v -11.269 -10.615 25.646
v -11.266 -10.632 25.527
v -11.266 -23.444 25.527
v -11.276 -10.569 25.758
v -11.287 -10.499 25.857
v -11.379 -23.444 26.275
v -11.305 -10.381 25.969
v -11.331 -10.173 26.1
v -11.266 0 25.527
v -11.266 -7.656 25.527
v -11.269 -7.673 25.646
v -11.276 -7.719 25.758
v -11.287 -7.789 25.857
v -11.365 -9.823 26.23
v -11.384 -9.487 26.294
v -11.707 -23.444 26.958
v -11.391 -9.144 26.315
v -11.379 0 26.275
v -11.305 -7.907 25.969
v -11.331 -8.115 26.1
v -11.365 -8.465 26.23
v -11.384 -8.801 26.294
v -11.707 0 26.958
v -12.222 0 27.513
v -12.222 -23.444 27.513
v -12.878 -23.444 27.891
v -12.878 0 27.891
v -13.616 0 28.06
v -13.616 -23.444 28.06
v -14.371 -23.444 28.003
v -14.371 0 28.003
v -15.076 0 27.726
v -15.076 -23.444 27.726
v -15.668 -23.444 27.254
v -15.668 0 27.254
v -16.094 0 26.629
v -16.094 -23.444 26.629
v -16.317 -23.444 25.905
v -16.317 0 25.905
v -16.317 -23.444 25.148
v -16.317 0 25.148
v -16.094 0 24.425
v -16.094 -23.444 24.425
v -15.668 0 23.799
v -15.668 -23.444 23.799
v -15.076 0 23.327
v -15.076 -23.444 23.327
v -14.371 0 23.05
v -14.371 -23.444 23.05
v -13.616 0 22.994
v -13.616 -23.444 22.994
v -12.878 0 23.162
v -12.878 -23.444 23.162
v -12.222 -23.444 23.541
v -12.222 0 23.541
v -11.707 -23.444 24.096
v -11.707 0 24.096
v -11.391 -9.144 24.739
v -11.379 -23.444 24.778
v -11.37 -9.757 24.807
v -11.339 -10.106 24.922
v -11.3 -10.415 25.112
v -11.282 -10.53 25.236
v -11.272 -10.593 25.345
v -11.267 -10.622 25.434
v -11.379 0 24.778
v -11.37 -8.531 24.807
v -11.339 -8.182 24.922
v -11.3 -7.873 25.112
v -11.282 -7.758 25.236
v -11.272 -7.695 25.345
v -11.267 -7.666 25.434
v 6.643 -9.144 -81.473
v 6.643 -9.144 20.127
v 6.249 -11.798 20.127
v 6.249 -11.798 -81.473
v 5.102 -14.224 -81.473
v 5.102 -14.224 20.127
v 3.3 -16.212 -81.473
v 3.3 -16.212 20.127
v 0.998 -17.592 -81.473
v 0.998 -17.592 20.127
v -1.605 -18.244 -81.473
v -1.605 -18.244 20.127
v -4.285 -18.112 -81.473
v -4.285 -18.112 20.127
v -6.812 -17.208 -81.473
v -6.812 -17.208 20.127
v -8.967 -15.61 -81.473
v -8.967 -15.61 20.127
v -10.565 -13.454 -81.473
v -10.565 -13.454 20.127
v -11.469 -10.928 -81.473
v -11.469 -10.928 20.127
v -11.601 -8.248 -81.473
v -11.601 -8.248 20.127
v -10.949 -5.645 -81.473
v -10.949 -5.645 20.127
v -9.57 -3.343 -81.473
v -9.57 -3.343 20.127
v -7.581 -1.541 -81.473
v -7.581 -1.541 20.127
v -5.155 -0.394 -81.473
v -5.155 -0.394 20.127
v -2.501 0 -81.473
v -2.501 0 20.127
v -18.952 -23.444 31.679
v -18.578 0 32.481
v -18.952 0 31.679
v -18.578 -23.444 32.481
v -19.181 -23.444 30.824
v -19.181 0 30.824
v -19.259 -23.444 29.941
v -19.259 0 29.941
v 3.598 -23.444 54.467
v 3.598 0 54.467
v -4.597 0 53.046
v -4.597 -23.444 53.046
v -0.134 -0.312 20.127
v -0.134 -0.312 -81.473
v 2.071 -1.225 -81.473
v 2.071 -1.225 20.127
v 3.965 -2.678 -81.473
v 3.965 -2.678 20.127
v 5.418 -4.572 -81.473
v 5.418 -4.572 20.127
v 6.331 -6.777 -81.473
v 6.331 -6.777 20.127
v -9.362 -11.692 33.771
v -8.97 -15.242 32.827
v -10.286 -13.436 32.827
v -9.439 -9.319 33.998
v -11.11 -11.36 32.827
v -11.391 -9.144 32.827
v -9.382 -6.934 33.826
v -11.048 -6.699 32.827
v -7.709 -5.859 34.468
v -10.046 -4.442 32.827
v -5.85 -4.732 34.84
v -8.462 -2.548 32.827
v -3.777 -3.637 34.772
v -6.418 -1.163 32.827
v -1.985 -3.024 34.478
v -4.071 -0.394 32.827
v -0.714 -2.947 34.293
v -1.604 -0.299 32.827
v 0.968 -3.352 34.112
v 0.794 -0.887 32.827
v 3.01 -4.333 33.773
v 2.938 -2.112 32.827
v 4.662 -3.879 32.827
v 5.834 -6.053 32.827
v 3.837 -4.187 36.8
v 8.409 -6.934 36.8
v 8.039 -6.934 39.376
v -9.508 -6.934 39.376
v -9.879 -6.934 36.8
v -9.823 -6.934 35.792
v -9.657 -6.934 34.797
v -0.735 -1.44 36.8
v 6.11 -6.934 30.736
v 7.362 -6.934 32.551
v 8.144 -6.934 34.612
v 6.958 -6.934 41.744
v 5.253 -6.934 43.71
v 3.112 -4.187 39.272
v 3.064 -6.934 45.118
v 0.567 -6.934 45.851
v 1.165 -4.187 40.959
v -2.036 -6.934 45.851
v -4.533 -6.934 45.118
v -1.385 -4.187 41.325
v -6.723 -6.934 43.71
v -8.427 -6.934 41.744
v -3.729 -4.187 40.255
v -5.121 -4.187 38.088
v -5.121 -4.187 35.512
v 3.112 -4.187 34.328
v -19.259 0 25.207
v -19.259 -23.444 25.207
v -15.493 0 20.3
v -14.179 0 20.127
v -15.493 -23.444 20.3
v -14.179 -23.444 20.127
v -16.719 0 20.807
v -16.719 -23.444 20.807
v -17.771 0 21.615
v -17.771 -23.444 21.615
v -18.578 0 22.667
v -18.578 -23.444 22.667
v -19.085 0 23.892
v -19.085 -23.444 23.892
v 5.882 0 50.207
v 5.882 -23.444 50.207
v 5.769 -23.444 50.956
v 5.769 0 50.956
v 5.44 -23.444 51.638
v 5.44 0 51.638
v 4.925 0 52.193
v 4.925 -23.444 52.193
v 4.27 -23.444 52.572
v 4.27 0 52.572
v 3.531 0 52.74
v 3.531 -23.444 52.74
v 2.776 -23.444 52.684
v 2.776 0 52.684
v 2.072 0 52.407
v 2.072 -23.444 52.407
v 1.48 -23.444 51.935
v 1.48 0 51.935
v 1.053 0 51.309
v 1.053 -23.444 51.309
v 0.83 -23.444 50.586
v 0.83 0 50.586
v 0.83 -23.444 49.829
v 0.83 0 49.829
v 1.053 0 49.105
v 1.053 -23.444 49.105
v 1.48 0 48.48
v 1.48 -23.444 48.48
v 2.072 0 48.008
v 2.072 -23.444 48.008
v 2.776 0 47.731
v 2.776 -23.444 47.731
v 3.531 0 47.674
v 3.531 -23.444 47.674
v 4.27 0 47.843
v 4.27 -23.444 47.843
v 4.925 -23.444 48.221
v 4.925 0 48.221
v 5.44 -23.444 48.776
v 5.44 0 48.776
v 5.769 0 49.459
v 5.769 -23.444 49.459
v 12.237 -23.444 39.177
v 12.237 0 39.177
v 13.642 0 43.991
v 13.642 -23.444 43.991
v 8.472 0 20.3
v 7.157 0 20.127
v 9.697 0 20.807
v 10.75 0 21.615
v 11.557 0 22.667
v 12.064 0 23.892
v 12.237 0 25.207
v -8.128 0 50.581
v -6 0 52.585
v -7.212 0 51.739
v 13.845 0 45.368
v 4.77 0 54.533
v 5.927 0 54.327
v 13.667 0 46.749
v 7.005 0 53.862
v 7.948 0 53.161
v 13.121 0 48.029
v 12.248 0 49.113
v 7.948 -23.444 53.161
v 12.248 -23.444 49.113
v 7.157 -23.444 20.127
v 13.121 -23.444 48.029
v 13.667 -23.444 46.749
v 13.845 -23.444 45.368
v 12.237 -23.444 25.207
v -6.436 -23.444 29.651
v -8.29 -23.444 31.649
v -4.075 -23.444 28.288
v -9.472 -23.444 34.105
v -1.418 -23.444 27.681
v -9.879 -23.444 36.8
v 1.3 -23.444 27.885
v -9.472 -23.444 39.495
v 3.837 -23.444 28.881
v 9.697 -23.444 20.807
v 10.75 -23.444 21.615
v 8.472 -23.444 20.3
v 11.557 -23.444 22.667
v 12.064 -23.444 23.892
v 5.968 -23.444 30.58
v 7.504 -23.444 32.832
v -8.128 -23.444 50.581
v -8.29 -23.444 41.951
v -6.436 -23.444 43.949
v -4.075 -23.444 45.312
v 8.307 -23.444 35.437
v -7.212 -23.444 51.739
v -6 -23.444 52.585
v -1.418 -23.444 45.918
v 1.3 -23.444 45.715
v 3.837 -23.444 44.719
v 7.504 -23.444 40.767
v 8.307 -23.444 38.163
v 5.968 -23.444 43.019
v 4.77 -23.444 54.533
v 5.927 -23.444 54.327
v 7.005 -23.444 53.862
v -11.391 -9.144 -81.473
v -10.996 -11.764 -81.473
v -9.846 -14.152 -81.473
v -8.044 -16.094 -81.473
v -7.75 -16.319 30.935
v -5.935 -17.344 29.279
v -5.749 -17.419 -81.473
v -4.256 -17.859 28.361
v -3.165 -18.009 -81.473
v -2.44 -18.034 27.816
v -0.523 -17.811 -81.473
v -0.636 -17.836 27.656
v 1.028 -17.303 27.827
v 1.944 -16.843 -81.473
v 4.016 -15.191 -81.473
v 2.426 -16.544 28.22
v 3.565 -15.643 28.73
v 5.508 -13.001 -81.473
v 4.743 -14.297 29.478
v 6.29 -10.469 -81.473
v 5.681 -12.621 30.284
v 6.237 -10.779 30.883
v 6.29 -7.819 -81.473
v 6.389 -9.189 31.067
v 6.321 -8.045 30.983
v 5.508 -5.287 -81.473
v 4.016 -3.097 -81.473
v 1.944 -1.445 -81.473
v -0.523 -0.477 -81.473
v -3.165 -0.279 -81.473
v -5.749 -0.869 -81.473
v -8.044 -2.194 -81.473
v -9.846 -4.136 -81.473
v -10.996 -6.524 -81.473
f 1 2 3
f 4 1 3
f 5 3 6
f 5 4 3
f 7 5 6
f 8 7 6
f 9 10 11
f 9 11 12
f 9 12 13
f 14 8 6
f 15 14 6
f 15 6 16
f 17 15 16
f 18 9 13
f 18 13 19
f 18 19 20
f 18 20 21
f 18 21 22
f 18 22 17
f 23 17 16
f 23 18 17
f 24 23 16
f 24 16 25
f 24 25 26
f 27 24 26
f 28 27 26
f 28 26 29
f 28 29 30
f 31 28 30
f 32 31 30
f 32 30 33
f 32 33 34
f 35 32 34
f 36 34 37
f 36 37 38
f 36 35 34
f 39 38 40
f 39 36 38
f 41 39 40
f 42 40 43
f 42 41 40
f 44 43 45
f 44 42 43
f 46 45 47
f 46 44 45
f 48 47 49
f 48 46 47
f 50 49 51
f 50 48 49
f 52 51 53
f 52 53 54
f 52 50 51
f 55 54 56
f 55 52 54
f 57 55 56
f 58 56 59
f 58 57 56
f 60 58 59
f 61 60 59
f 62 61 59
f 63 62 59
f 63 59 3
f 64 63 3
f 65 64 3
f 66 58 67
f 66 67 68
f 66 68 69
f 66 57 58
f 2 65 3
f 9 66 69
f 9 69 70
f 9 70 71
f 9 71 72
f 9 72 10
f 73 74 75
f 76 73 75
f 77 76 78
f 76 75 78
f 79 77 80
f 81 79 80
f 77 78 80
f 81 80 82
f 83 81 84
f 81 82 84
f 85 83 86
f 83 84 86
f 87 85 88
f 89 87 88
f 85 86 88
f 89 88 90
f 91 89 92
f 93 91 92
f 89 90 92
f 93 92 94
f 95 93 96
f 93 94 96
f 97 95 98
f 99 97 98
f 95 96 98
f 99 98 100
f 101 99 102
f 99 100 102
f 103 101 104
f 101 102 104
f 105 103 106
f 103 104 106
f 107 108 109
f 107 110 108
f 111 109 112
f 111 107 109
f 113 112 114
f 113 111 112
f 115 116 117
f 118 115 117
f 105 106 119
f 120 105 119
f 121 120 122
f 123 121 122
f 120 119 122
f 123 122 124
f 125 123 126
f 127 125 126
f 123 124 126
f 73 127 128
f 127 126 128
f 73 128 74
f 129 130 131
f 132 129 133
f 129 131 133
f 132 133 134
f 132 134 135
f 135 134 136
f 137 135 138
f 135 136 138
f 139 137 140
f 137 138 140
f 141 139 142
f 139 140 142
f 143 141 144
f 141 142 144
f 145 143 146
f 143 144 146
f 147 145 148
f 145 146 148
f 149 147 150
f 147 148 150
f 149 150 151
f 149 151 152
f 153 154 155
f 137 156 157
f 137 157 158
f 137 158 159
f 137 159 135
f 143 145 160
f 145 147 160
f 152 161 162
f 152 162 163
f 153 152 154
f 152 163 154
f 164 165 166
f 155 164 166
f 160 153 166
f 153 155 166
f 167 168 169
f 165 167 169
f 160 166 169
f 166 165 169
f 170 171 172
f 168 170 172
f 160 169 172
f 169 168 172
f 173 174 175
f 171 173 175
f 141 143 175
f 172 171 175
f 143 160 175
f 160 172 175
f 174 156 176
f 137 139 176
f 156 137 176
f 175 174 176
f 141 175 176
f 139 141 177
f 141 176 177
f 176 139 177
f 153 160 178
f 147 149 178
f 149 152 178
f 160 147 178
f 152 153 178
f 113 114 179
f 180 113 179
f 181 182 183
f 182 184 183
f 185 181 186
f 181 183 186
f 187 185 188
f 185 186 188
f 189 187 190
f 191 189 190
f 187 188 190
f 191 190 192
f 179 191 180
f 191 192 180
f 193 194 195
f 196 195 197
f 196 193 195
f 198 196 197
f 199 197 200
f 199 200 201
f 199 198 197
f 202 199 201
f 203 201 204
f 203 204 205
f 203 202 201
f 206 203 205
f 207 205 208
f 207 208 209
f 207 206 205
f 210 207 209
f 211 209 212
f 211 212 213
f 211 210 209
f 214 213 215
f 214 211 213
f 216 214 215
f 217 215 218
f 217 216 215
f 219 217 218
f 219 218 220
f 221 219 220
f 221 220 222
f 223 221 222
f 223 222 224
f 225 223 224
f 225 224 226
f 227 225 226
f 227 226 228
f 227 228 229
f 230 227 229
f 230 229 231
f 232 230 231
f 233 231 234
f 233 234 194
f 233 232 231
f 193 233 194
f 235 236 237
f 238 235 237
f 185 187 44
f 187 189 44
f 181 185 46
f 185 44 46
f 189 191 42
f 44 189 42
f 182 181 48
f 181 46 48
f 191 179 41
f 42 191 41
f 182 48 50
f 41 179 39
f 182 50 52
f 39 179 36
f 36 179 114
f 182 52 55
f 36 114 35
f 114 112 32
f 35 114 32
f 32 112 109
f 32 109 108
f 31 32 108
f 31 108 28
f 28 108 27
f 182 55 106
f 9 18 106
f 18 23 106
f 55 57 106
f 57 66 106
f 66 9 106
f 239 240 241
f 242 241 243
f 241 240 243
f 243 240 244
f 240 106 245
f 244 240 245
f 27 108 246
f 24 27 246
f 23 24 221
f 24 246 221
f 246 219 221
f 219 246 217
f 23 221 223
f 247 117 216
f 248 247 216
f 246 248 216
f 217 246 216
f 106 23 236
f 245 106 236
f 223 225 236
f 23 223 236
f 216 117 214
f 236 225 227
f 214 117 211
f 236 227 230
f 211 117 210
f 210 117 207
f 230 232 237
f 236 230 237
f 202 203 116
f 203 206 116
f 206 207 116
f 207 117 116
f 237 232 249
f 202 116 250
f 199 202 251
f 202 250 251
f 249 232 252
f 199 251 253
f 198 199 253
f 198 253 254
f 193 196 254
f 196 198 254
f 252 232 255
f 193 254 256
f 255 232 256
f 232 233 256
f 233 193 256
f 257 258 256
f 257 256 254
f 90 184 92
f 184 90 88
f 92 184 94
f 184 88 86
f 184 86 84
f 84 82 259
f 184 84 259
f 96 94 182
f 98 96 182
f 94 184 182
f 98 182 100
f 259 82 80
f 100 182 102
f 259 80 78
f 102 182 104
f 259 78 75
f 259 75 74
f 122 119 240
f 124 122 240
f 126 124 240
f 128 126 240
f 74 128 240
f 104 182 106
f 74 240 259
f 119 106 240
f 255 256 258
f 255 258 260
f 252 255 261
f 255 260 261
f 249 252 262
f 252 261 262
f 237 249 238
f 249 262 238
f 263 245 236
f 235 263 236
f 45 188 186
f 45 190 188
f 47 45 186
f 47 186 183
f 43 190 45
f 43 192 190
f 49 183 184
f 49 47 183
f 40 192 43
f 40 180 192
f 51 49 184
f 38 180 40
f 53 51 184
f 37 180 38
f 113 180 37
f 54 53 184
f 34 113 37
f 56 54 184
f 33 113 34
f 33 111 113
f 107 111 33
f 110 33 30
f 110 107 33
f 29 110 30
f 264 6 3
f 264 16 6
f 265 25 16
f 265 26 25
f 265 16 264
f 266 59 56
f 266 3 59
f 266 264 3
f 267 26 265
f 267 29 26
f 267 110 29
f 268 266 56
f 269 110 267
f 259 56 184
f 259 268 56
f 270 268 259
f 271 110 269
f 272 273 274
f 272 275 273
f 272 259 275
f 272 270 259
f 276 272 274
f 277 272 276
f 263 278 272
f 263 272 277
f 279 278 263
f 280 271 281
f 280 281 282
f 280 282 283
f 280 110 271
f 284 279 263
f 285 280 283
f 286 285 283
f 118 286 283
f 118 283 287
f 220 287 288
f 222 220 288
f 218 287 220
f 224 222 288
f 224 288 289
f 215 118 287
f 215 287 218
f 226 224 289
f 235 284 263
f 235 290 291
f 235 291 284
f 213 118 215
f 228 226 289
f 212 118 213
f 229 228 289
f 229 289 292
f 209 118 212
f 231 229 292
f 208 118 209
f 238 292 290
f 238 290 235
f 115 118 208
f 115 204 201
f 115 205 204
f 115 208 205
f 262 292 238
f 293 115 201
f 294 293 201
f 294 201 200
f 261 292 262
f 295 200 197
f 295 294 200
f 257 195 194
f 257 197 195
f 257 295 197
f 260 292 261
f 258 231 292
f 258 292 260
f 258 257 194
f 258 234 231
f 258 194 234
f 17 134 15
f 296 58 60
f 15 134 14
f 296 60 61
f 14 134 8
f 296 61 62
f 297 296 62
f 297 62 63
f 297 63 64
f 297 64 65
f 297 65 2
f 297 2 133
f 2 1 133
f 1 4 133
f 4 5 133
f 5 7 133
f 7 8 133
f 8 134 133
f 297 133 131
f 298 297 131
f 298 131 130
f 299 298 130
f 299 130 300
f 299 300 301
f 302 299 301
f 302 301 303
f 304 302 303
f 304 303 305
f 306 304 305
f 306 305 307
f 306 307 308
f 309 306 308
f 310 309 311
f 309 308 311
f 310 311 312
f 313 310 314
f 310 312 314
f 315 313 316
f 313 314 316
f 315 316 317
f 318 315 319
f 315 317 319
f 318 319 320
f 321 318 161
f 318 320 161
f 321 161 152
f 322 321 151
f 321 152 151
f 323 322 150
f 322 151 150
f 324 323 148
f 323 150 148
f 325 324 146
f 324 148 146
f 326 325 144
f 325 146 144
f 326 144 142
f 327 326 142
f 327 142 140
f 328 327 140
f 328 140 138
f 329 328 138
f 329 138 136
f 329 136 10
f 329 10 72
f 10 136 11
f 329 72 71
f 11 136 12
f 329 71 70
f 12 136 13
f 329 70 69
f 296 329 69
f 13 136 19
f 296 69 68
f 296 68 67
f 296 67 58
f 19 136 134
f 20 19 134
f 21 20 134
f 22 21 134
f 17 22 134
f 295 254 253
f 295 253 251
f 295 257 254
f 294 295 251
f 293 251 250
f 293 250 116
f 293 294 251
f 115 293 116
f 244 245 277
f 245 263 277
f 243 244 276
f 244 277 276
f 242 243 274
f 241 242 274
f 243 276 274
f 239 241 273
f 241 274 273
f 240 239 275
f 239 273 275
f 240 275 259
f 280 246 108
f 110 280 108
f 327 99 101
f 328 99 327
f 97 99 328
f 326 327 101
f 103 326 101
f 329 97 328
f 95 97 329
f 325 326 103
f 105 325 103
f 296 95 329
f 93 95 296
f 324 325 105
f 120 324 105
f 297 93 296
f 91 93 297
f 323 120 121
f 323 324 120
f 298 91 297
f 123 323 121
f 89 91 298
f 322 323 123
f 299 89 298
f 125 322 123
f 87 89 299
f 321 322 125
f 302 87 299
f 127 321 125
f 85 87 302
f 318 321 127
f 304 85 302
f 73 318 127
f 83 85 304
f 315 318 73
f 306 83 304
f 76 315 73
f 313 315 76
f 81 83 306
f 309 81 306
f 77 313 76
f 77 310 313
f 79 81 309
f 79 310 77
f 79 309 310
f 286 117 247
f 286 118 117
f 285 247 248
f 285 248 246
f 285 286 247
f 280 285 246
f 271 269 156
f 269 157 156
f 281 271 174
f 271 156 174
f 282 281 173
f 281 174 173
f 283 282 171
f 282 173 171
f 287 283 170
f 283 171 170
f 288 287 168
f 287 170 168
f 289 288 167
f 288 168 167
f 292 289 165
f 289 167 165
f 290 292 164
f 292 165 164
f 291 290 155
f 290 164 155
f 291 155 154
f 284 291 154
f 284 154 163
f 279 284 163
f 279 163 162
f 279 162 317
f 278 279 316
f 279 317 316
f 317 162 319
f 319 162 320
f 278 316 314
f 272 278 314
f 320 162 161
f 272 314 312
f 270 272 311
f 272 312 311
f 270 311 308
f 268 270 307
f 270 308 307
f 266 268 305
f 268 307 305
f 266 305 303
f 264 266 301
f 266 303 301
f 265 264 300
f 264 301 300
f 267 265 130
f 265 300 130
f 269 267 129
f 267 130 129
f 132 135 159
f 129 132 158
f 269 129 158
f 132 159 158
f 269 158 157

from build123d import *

# Parameters (mm, degrees)
F0_R     = 2.54
F1_DEPTH = 23.4442
F3_D     = 18.288
F3_DEPTH = 16.51
F3_TIP   = 5.4942695004
F5_DEPTH = 101.6
F7_D     = 17.78
F7_DEPTH = 114.3
F7_TIP   = 5.3416509032
F8_R     = 5.08


with BuildPart() as f1:
    # F0 (on Front) → F1 (new body)
    with BuildSketch(Plane.XZ):
        Polygon((14.5139638376, 46.979337565), (6.0992269906, 54.9012346102), (-6.9395108012, 52.6397765944), (-19.2585108012, 31.302642696), (-19.2585108012, 20.126642696), (0.6639761268, 20.126642696), (12.2374891988, 20.126642696), (12.2374891988, 39.176642696), align=None)
        with Locations((-13.805717687, 25.5267831615)):
            Circle(F0_R, mode=Mode.SUBTRACT)
        with Locations((3.3416109761, 50.2072100538)):
            Circle(F0_R, mode=Mode.SUBTRACT)
    extrude(amount=F1_DEPTH)

    # F3
    with Locations(Plane.XZ.offset(23.4442)):
        with Locations((-0.7346722452, 36.7999244481)):
            Hole(F3_D / 2, depth=F3_DEPTH)
            with Locations((0, 0, -(F3_DEPTH + F3_TIP / 2))):  # 118° drill point
                Cone(0, F3_D / 2, F3_TIP, mode=Mode.SUBTRACT)

    # F4 (on face) → F5 (join)
    with BuildSketch(Plane(origin=(0, 0, 20.126642696), x_dir=(1, 0, 0), z_dir=(0, 0, -1))):
        with BuildLine():
            ThreePointArc((-2.5011187059, 0), (3.9646657012, 2.6782155928), (6.6428812941, 9.144))
            ThreePointArc((6.6428812941, 9.144), (-8.9669031131, 15.6097844072), (-2.5011187059, 0))
        make_face()
    extrude(amount=F5_DEPTH)

    # F7
    with Locations(Plane(origin=(0, 0, -81.473357304), x_dir=(1, 0, 0), z_dir=(0, 0, -1))):
        with Locations((-2.5011187059, 9.144)):
            Hole(F7_D / 2, depth=F7_DEPTH)
            with Locations((0, 0, -(F7_DEPTH + F7_TIP / 2))):  # 118° drill point
                Cone(0, F7_D / 2, F7_TIP, mode=Mode.SUBTRACT)

    # F8
    f8_edges = [f1.edges().sort_by_distance(p)[0] for p in [
        (6.099227, -11.7221, 54.901235),
        (14.513964, -11.7221, 46.979338),
        (12.237489, -11.7221, 20.126643),
        (-19.258511, -11.7221, 20.126643),
        (-6.939511, -11.7221, 52.639777),
        (-19.258511, -11.7221, 31.302643),
    ]]
    fillet(f8_edges, radius=F8_R)


solid = f1.part
